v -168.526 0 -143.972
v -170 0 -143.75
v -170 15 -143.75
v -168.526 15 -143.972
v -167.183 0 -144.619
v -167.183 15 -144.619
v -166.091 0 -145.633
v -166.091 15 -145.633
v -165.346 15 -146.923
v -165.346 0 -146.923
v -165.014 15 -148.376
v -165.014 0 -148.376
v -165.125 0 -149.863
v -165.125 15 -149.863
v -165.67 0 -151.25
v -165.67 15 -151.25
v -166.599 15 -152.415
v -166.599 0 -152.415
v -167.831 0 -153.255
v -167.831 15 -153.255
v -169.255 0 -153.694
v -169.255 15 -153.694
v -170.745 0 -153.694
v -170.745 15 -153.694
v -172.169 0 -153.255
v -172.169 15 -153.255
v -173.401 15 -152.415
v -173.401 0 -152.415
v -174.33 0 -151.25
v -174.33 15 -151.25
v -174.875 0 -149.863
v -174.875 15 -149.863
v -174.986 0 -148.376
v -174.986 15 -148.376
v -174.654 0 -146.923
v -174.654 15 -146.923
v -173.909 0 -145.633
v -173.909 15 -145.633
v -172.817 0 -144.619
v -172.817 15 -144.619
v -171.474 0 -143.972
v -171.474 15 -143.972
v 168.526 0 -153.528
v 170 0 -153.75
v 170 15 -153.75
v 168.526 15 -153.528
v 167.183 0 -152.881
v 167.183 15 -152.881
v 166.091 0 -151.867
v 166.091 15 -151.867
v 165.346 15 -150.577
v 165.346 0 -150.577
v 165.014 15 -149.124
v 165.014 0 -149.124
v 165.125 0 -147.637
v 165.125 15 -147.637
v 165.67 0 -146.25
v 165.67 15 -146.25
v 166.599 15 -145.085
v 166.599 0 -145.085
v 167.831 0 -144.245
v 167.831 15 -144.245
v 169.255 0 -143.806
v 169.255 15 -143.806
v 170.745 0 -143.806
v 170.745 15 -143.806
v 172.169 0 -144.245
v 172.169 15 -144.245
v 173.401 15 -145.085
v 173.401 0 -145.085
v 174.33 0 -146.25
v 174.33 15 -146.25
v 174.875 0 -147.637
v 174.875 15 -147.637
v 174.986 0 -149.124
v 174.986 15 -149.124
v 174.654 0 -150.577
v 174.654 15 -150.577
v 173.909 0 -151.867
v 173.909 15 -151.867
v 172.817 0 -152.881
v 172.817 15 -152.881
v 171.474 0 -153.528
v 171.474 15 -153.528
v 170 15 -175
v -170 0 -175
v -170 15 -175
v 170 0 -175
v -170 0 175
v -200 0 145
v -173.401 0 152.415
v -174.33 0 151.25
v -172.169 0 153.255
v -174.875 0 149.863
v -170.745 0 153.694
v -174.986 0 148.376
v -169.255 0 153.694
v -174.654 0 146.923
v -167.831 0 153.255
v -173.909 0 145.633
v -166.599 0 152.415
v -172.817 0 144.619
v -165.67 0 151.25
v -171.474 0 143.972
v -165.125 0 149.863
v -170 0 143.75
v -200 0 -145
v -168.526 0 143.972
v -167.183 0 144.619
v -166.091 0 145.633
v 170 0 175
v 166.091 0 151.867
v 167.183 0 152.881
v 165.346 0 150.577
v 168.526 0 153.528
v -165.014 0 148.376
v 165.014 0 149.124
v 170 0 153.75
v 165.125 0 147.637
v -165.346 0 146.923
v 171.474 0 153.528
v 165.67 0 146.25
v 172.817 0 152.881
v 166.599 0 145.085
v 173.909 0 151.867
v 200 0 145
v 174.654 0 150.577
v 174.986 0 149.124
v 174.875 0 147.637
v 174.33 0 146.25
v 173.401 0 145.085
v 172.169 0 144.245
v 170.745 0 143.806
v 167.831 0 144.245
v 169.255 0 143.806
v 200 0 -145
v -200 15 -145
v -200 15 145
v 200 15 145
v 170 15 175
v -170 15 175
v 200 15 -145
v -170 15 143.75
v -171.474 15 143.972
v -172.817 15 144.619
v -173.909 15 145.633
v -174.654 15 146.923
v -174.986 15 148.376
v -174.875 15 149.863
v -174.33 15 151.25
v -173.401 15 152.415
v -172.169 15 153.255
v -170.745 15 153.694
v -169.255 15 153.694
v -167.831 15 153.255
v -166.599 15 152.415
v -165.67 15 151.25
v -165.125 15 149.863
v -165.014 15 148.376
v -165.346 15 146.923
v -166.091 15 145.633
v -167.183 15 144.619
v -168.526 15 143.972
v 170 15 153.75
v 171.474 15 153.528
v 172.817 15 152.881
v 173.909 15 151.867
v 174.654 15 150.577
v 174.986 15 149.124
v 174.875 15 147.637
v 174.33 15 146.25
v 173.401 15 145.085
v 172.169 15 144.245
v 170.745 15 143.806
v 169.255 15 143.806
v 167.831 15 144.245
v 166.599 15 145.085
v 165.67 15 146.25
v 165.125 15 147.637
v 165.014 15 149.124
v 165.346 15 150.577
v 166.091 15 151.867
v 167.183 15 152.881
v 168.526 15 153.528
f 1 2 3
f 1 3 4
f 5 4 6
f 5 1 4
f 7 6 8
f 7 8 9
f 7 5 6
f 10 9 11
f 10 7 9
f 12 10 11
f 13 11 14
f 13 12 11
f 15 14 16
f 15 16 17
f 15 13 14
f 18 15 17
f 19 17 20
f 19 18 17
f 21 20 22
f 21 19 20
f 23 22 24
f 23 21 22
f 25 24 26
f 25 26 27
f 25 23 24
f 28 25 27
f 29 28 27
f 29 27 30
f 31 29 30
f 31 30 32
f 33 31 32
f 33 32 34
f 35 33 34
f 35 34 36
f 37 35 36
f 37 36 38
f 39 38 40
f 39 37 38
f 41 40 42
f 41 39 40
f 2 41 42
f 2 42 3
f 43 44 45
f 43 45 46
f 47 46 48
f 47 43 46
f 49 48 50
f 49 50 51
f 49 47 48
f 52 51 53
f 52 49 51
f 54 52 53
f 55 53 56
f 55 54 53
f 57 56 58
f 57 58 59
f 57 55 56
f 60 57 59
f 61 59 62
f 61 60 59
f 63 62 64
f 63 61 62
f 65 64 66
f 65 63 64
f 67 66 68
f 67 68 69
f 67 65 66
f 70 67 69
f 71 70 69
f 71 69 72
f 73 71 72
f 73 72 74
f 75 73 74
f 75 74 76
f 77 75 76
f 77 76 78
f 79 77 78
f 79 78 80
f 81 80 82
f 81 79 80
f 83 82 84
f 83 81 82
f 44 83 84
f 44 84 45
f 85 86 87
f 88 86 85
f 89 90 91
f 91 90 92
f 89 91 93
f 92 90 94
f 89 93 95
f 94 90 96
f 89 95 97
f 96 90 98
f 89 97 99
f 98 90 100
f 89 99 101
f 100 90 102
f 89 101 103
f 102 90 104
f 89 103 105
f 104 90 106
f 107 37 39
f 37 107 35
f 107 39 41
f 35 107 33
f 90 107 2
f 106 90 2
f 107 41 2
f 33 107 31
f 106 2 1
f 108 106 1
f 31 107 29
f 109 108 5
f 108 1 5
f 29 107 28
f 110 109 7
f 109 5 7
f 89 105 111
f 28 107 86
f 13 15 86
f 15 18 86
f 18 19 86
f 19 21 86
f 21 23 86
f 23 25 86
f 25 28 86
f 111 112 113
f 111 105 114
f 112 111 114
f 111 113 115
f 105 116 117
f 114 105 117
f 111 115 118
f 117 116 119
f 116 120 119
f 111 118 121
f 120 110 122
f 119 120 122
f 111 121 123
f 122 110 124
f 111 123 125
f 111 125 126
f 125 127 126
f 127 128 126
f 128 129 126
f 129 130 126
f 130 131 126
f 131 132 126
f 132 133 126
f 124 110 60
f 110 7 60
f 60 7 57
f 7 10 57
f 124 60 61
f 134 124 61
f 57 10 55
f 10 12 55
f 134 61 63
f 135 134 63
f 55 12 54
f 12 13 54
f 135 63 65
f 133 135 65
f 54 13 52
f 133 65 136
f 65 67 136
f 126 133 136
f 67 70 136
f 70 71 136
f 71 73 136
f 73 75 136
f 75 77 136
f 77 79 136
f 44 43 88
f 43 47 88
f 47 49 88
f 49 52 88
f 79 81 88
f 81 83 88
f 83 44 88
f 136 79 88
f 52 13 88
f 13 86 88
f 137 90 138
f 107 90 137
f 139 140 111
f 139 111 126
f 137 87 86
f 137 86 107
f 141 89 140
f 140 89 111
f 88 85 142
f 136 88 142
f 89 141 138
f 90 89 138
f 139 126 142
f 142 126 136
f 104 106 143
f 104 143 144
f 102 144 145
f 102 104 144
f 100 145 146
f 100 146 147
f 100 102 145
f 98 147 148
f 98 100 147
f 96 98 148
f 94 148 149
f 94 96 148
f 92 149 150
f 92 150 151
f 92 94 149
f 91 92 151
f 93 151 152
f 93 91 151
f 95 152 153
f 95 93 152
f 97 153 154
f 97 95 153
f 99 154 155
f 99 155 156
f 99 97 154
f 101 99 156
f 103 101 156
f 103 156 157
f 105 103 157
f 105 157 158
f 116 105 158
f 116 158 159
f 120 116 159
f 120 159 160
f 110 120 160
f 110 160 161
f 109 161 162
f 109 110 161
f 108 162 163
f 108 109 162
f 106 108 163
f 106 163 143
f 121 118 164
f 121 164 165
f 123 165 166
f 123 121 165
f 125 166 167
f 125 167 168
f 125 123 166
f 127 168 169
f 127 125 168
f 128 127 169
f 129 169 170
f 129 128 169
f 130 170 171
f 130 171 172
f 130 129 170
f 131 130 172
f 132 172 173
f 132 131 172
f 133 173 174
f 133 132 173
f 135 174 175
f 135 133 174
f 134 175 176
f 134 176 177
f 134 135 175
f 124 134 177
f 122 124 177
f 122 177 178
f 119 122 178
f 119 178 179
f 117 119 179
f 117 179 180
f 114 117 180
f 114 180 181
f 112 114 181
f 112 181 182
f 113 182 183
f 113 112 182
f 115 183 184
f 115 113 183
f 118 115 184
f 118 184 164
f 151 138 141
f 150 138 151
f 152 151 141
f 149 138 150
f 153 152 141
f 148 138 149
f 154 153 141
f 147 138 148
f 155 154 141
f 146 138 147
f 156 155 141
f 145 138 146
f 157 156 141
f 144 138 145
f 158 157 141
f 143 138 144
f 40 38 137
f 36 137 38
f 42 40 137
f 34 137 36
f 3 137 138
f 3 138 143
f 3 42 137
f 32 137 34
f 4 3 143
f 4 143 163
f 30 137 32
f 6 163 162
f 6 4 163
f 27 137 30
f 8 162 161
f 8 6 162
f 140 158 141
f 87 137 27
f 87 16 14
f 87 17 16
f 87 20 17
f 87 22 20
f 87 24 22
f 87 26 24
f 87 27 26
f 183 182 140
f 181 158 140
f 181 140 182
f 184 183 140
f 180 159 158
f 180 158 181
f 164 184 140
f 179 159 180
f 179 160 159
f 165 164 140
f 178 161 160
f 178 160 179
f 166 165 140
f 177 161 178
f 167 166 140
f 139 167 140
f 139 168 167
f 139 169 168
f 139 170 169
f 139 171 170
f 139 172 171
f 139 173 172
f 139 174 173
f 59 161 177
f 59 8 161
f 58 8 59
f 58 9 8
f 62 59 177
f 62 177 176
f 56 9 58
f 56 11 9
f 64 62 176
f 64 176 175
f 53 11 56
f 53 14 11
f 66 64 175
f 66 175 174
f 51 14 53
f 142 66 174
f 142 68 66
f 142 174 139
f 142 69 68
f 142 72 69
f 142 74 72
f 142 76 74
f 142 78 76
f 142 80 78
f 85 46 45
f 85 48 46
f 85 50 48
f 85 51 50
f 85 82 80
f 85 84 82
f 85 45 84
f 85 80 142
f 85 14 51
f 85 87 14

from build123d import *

# Parameters (mm, degrees)
SKETCH1_W           = 400
SKETCH1_H           = 350
SKETCH1_R           = 5
BOSS_EXTRUDE1_DEPTH = 15
CUT_EXTRUDE1_DEPTH  = 267.176633084


with BuildPart() as part:
    # Sketch1 → Boss-Extrude1 (new body)
    with BuildSketch(Plane(origin=(0, 0, 0), x_dir=(1, 0, 0), z_dir=(0, 1, 0))):
        Rectangle(SKETCH1_W, SKETCH1_H)
        with Locations(Location((-170, 148.75, 0), (0, 0, 270))):
            Circle(SKETCH1_R, mode=Mode.SUBTRACT)
        with Locations(Location((170, 148.75, 0), (0, 0, 90))):
            Circle(SKETCH1_R, mode=Mode.SUBTRACT)
        with Locations(Location((170, -148.75, 0), (0, 0, 270))):
            Circle(SKETCH1_R, mode=Mode.SUBTRACT)
        with Locations(Location((-170, -148.75, 0), (0, 0, 90))):
            Circle(SKETCH1_R, mode=Mode.SUBTRACT)
    extrude(amount=BOSS_EXTRUDE1_DEPTH)

    # Sketch2 → Cut-Extrude1 (cut, through all)
    with BuildSketch(Plane(origin=(0, 15, 0), x_dir=(1, 0, 0), z_dir=(0, 1, 0))):
        Polygon((-170, 175), (-200, 145), (-200, 175), align=None)
        Polygon((170, 175), (200, 145), (200, 175), align=None)
        Polygon((200, -175), (170, -175), (200, -145), align=None)
        Polygon((-170, -175), (-200, -145), (-200, -175), align=None)
    extrude(amount=-CUT_EXTRUDE1_DEPTH, mode=Mode.SUBTRACT)


solid = part.part
